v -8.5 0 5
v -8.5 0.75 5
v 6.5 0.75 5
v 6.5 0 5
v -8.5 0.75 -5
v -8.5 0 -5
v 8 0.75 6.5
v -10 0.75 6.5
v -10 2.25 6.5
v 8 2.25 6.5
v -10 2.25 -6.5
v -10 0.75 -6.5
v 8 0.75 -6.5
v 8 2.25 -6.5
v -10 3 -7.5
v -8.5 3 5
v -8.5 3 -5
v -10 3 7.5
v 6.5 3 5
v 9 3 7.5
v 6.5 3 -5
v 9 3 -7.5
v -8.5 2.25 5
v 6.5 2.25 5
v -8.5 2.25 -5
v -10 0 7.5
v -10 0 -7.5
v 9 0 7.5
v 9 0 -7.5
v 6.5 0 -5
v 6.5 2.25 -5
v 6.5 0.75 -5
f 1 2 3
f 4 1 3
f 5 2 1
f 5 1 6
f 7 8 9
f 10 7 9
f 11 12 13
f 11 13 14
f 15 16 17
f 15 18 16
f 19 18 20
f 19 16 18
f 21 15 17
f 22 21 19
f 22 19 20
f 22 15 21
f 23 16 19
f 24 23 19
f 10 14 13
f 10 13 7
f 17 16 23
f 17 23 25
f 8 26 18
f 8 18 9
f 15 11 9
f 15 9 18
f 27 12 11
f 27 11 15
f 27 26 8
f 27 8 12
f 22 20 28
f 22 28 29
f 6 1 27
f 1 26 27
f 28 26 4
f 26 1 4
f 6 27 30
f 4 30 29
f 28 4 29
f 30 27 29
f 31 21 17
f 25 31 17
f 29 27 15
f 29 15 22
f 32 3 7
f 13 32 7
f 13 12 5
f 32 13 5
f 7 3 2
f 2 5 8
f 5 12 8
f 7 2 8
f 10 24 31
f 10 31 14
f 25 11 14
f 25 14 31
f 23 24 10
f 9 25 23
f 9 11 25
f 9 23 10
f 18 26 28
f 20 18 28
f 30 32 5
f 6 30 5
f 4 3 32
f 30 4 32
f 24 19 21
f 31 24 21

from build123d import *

# Parameters (mm, degrees)
SKETCH1_W           = 20
SKETCH1_H           = 15
BOSS_EXTRUDE3_DEPTH = 3
SKETCH4_W           = 13
SKETCH4_H           = 1.5
CUT_EXTRUDE1_DEPTH  = 18
SKETCH5_W           = 15
SKETCH5_H           = 10
CUT_EXTRUDE2_DEPTH  = 18
SKETCH5_3_W         = 1
SKETCH5_3_H         = 15
CUT_EXTRUDE3_DEPTH  = 18


with BuildPart() as part:
    # Sketch1 → Boss-Extrude3 (new body)
    with BuildSketch(Plane(origin=(0, 0, 0), x_dir=(1, 0, 0), z_dir=(0, 1, 0))):
        Rectangle(SKETCH1_W, SKETCH1_H)
    extrude(amount=BOSS_EXTRUDE3_DEPTH)

    # Sketch4 → Cut-Extrude1 (cut)
    with BuildSketch(Plane.ZY.offset(10)):
        with Locations((0, 1.5)):
            Rectangle(SKETCH4_W, SKETCH4_H)
    extrude(amount=-CUT_EXTRUDE1_DEPTH, mode=Mode.SUBTRACT)

    # Sketch5 → Cut-Extrude2 (cut)
    with BuildSketch(Plane(origin=(0, 3, 0), x_dir=(1, 0, 0), z_dir=(0, 1, 0))):
        with Locations((-1, 0)):
            Rectangle(SKETCH5_W, SKETCH5_H)
    extrude(amount=-CUT_EXTRUDE2_DEPTH, mode=Mode.SUBTRACT)

    # Sketch5<3> → Cut-Extrude3 (cut)
    with BuildSketch(Plane(origin=(0, 3, 0), x_dir=(1, 0, 0), z_dir=(0, 1, 0))):
        with Locations((9.5, 0)):
            Rectangle(SKETCH5_3_W, SKETCH5_3_H)
    extrude(amount=-CUT_EXTRUDE3_DEPTH, mode=Mode.SUBTRACT)


solid = part.part
